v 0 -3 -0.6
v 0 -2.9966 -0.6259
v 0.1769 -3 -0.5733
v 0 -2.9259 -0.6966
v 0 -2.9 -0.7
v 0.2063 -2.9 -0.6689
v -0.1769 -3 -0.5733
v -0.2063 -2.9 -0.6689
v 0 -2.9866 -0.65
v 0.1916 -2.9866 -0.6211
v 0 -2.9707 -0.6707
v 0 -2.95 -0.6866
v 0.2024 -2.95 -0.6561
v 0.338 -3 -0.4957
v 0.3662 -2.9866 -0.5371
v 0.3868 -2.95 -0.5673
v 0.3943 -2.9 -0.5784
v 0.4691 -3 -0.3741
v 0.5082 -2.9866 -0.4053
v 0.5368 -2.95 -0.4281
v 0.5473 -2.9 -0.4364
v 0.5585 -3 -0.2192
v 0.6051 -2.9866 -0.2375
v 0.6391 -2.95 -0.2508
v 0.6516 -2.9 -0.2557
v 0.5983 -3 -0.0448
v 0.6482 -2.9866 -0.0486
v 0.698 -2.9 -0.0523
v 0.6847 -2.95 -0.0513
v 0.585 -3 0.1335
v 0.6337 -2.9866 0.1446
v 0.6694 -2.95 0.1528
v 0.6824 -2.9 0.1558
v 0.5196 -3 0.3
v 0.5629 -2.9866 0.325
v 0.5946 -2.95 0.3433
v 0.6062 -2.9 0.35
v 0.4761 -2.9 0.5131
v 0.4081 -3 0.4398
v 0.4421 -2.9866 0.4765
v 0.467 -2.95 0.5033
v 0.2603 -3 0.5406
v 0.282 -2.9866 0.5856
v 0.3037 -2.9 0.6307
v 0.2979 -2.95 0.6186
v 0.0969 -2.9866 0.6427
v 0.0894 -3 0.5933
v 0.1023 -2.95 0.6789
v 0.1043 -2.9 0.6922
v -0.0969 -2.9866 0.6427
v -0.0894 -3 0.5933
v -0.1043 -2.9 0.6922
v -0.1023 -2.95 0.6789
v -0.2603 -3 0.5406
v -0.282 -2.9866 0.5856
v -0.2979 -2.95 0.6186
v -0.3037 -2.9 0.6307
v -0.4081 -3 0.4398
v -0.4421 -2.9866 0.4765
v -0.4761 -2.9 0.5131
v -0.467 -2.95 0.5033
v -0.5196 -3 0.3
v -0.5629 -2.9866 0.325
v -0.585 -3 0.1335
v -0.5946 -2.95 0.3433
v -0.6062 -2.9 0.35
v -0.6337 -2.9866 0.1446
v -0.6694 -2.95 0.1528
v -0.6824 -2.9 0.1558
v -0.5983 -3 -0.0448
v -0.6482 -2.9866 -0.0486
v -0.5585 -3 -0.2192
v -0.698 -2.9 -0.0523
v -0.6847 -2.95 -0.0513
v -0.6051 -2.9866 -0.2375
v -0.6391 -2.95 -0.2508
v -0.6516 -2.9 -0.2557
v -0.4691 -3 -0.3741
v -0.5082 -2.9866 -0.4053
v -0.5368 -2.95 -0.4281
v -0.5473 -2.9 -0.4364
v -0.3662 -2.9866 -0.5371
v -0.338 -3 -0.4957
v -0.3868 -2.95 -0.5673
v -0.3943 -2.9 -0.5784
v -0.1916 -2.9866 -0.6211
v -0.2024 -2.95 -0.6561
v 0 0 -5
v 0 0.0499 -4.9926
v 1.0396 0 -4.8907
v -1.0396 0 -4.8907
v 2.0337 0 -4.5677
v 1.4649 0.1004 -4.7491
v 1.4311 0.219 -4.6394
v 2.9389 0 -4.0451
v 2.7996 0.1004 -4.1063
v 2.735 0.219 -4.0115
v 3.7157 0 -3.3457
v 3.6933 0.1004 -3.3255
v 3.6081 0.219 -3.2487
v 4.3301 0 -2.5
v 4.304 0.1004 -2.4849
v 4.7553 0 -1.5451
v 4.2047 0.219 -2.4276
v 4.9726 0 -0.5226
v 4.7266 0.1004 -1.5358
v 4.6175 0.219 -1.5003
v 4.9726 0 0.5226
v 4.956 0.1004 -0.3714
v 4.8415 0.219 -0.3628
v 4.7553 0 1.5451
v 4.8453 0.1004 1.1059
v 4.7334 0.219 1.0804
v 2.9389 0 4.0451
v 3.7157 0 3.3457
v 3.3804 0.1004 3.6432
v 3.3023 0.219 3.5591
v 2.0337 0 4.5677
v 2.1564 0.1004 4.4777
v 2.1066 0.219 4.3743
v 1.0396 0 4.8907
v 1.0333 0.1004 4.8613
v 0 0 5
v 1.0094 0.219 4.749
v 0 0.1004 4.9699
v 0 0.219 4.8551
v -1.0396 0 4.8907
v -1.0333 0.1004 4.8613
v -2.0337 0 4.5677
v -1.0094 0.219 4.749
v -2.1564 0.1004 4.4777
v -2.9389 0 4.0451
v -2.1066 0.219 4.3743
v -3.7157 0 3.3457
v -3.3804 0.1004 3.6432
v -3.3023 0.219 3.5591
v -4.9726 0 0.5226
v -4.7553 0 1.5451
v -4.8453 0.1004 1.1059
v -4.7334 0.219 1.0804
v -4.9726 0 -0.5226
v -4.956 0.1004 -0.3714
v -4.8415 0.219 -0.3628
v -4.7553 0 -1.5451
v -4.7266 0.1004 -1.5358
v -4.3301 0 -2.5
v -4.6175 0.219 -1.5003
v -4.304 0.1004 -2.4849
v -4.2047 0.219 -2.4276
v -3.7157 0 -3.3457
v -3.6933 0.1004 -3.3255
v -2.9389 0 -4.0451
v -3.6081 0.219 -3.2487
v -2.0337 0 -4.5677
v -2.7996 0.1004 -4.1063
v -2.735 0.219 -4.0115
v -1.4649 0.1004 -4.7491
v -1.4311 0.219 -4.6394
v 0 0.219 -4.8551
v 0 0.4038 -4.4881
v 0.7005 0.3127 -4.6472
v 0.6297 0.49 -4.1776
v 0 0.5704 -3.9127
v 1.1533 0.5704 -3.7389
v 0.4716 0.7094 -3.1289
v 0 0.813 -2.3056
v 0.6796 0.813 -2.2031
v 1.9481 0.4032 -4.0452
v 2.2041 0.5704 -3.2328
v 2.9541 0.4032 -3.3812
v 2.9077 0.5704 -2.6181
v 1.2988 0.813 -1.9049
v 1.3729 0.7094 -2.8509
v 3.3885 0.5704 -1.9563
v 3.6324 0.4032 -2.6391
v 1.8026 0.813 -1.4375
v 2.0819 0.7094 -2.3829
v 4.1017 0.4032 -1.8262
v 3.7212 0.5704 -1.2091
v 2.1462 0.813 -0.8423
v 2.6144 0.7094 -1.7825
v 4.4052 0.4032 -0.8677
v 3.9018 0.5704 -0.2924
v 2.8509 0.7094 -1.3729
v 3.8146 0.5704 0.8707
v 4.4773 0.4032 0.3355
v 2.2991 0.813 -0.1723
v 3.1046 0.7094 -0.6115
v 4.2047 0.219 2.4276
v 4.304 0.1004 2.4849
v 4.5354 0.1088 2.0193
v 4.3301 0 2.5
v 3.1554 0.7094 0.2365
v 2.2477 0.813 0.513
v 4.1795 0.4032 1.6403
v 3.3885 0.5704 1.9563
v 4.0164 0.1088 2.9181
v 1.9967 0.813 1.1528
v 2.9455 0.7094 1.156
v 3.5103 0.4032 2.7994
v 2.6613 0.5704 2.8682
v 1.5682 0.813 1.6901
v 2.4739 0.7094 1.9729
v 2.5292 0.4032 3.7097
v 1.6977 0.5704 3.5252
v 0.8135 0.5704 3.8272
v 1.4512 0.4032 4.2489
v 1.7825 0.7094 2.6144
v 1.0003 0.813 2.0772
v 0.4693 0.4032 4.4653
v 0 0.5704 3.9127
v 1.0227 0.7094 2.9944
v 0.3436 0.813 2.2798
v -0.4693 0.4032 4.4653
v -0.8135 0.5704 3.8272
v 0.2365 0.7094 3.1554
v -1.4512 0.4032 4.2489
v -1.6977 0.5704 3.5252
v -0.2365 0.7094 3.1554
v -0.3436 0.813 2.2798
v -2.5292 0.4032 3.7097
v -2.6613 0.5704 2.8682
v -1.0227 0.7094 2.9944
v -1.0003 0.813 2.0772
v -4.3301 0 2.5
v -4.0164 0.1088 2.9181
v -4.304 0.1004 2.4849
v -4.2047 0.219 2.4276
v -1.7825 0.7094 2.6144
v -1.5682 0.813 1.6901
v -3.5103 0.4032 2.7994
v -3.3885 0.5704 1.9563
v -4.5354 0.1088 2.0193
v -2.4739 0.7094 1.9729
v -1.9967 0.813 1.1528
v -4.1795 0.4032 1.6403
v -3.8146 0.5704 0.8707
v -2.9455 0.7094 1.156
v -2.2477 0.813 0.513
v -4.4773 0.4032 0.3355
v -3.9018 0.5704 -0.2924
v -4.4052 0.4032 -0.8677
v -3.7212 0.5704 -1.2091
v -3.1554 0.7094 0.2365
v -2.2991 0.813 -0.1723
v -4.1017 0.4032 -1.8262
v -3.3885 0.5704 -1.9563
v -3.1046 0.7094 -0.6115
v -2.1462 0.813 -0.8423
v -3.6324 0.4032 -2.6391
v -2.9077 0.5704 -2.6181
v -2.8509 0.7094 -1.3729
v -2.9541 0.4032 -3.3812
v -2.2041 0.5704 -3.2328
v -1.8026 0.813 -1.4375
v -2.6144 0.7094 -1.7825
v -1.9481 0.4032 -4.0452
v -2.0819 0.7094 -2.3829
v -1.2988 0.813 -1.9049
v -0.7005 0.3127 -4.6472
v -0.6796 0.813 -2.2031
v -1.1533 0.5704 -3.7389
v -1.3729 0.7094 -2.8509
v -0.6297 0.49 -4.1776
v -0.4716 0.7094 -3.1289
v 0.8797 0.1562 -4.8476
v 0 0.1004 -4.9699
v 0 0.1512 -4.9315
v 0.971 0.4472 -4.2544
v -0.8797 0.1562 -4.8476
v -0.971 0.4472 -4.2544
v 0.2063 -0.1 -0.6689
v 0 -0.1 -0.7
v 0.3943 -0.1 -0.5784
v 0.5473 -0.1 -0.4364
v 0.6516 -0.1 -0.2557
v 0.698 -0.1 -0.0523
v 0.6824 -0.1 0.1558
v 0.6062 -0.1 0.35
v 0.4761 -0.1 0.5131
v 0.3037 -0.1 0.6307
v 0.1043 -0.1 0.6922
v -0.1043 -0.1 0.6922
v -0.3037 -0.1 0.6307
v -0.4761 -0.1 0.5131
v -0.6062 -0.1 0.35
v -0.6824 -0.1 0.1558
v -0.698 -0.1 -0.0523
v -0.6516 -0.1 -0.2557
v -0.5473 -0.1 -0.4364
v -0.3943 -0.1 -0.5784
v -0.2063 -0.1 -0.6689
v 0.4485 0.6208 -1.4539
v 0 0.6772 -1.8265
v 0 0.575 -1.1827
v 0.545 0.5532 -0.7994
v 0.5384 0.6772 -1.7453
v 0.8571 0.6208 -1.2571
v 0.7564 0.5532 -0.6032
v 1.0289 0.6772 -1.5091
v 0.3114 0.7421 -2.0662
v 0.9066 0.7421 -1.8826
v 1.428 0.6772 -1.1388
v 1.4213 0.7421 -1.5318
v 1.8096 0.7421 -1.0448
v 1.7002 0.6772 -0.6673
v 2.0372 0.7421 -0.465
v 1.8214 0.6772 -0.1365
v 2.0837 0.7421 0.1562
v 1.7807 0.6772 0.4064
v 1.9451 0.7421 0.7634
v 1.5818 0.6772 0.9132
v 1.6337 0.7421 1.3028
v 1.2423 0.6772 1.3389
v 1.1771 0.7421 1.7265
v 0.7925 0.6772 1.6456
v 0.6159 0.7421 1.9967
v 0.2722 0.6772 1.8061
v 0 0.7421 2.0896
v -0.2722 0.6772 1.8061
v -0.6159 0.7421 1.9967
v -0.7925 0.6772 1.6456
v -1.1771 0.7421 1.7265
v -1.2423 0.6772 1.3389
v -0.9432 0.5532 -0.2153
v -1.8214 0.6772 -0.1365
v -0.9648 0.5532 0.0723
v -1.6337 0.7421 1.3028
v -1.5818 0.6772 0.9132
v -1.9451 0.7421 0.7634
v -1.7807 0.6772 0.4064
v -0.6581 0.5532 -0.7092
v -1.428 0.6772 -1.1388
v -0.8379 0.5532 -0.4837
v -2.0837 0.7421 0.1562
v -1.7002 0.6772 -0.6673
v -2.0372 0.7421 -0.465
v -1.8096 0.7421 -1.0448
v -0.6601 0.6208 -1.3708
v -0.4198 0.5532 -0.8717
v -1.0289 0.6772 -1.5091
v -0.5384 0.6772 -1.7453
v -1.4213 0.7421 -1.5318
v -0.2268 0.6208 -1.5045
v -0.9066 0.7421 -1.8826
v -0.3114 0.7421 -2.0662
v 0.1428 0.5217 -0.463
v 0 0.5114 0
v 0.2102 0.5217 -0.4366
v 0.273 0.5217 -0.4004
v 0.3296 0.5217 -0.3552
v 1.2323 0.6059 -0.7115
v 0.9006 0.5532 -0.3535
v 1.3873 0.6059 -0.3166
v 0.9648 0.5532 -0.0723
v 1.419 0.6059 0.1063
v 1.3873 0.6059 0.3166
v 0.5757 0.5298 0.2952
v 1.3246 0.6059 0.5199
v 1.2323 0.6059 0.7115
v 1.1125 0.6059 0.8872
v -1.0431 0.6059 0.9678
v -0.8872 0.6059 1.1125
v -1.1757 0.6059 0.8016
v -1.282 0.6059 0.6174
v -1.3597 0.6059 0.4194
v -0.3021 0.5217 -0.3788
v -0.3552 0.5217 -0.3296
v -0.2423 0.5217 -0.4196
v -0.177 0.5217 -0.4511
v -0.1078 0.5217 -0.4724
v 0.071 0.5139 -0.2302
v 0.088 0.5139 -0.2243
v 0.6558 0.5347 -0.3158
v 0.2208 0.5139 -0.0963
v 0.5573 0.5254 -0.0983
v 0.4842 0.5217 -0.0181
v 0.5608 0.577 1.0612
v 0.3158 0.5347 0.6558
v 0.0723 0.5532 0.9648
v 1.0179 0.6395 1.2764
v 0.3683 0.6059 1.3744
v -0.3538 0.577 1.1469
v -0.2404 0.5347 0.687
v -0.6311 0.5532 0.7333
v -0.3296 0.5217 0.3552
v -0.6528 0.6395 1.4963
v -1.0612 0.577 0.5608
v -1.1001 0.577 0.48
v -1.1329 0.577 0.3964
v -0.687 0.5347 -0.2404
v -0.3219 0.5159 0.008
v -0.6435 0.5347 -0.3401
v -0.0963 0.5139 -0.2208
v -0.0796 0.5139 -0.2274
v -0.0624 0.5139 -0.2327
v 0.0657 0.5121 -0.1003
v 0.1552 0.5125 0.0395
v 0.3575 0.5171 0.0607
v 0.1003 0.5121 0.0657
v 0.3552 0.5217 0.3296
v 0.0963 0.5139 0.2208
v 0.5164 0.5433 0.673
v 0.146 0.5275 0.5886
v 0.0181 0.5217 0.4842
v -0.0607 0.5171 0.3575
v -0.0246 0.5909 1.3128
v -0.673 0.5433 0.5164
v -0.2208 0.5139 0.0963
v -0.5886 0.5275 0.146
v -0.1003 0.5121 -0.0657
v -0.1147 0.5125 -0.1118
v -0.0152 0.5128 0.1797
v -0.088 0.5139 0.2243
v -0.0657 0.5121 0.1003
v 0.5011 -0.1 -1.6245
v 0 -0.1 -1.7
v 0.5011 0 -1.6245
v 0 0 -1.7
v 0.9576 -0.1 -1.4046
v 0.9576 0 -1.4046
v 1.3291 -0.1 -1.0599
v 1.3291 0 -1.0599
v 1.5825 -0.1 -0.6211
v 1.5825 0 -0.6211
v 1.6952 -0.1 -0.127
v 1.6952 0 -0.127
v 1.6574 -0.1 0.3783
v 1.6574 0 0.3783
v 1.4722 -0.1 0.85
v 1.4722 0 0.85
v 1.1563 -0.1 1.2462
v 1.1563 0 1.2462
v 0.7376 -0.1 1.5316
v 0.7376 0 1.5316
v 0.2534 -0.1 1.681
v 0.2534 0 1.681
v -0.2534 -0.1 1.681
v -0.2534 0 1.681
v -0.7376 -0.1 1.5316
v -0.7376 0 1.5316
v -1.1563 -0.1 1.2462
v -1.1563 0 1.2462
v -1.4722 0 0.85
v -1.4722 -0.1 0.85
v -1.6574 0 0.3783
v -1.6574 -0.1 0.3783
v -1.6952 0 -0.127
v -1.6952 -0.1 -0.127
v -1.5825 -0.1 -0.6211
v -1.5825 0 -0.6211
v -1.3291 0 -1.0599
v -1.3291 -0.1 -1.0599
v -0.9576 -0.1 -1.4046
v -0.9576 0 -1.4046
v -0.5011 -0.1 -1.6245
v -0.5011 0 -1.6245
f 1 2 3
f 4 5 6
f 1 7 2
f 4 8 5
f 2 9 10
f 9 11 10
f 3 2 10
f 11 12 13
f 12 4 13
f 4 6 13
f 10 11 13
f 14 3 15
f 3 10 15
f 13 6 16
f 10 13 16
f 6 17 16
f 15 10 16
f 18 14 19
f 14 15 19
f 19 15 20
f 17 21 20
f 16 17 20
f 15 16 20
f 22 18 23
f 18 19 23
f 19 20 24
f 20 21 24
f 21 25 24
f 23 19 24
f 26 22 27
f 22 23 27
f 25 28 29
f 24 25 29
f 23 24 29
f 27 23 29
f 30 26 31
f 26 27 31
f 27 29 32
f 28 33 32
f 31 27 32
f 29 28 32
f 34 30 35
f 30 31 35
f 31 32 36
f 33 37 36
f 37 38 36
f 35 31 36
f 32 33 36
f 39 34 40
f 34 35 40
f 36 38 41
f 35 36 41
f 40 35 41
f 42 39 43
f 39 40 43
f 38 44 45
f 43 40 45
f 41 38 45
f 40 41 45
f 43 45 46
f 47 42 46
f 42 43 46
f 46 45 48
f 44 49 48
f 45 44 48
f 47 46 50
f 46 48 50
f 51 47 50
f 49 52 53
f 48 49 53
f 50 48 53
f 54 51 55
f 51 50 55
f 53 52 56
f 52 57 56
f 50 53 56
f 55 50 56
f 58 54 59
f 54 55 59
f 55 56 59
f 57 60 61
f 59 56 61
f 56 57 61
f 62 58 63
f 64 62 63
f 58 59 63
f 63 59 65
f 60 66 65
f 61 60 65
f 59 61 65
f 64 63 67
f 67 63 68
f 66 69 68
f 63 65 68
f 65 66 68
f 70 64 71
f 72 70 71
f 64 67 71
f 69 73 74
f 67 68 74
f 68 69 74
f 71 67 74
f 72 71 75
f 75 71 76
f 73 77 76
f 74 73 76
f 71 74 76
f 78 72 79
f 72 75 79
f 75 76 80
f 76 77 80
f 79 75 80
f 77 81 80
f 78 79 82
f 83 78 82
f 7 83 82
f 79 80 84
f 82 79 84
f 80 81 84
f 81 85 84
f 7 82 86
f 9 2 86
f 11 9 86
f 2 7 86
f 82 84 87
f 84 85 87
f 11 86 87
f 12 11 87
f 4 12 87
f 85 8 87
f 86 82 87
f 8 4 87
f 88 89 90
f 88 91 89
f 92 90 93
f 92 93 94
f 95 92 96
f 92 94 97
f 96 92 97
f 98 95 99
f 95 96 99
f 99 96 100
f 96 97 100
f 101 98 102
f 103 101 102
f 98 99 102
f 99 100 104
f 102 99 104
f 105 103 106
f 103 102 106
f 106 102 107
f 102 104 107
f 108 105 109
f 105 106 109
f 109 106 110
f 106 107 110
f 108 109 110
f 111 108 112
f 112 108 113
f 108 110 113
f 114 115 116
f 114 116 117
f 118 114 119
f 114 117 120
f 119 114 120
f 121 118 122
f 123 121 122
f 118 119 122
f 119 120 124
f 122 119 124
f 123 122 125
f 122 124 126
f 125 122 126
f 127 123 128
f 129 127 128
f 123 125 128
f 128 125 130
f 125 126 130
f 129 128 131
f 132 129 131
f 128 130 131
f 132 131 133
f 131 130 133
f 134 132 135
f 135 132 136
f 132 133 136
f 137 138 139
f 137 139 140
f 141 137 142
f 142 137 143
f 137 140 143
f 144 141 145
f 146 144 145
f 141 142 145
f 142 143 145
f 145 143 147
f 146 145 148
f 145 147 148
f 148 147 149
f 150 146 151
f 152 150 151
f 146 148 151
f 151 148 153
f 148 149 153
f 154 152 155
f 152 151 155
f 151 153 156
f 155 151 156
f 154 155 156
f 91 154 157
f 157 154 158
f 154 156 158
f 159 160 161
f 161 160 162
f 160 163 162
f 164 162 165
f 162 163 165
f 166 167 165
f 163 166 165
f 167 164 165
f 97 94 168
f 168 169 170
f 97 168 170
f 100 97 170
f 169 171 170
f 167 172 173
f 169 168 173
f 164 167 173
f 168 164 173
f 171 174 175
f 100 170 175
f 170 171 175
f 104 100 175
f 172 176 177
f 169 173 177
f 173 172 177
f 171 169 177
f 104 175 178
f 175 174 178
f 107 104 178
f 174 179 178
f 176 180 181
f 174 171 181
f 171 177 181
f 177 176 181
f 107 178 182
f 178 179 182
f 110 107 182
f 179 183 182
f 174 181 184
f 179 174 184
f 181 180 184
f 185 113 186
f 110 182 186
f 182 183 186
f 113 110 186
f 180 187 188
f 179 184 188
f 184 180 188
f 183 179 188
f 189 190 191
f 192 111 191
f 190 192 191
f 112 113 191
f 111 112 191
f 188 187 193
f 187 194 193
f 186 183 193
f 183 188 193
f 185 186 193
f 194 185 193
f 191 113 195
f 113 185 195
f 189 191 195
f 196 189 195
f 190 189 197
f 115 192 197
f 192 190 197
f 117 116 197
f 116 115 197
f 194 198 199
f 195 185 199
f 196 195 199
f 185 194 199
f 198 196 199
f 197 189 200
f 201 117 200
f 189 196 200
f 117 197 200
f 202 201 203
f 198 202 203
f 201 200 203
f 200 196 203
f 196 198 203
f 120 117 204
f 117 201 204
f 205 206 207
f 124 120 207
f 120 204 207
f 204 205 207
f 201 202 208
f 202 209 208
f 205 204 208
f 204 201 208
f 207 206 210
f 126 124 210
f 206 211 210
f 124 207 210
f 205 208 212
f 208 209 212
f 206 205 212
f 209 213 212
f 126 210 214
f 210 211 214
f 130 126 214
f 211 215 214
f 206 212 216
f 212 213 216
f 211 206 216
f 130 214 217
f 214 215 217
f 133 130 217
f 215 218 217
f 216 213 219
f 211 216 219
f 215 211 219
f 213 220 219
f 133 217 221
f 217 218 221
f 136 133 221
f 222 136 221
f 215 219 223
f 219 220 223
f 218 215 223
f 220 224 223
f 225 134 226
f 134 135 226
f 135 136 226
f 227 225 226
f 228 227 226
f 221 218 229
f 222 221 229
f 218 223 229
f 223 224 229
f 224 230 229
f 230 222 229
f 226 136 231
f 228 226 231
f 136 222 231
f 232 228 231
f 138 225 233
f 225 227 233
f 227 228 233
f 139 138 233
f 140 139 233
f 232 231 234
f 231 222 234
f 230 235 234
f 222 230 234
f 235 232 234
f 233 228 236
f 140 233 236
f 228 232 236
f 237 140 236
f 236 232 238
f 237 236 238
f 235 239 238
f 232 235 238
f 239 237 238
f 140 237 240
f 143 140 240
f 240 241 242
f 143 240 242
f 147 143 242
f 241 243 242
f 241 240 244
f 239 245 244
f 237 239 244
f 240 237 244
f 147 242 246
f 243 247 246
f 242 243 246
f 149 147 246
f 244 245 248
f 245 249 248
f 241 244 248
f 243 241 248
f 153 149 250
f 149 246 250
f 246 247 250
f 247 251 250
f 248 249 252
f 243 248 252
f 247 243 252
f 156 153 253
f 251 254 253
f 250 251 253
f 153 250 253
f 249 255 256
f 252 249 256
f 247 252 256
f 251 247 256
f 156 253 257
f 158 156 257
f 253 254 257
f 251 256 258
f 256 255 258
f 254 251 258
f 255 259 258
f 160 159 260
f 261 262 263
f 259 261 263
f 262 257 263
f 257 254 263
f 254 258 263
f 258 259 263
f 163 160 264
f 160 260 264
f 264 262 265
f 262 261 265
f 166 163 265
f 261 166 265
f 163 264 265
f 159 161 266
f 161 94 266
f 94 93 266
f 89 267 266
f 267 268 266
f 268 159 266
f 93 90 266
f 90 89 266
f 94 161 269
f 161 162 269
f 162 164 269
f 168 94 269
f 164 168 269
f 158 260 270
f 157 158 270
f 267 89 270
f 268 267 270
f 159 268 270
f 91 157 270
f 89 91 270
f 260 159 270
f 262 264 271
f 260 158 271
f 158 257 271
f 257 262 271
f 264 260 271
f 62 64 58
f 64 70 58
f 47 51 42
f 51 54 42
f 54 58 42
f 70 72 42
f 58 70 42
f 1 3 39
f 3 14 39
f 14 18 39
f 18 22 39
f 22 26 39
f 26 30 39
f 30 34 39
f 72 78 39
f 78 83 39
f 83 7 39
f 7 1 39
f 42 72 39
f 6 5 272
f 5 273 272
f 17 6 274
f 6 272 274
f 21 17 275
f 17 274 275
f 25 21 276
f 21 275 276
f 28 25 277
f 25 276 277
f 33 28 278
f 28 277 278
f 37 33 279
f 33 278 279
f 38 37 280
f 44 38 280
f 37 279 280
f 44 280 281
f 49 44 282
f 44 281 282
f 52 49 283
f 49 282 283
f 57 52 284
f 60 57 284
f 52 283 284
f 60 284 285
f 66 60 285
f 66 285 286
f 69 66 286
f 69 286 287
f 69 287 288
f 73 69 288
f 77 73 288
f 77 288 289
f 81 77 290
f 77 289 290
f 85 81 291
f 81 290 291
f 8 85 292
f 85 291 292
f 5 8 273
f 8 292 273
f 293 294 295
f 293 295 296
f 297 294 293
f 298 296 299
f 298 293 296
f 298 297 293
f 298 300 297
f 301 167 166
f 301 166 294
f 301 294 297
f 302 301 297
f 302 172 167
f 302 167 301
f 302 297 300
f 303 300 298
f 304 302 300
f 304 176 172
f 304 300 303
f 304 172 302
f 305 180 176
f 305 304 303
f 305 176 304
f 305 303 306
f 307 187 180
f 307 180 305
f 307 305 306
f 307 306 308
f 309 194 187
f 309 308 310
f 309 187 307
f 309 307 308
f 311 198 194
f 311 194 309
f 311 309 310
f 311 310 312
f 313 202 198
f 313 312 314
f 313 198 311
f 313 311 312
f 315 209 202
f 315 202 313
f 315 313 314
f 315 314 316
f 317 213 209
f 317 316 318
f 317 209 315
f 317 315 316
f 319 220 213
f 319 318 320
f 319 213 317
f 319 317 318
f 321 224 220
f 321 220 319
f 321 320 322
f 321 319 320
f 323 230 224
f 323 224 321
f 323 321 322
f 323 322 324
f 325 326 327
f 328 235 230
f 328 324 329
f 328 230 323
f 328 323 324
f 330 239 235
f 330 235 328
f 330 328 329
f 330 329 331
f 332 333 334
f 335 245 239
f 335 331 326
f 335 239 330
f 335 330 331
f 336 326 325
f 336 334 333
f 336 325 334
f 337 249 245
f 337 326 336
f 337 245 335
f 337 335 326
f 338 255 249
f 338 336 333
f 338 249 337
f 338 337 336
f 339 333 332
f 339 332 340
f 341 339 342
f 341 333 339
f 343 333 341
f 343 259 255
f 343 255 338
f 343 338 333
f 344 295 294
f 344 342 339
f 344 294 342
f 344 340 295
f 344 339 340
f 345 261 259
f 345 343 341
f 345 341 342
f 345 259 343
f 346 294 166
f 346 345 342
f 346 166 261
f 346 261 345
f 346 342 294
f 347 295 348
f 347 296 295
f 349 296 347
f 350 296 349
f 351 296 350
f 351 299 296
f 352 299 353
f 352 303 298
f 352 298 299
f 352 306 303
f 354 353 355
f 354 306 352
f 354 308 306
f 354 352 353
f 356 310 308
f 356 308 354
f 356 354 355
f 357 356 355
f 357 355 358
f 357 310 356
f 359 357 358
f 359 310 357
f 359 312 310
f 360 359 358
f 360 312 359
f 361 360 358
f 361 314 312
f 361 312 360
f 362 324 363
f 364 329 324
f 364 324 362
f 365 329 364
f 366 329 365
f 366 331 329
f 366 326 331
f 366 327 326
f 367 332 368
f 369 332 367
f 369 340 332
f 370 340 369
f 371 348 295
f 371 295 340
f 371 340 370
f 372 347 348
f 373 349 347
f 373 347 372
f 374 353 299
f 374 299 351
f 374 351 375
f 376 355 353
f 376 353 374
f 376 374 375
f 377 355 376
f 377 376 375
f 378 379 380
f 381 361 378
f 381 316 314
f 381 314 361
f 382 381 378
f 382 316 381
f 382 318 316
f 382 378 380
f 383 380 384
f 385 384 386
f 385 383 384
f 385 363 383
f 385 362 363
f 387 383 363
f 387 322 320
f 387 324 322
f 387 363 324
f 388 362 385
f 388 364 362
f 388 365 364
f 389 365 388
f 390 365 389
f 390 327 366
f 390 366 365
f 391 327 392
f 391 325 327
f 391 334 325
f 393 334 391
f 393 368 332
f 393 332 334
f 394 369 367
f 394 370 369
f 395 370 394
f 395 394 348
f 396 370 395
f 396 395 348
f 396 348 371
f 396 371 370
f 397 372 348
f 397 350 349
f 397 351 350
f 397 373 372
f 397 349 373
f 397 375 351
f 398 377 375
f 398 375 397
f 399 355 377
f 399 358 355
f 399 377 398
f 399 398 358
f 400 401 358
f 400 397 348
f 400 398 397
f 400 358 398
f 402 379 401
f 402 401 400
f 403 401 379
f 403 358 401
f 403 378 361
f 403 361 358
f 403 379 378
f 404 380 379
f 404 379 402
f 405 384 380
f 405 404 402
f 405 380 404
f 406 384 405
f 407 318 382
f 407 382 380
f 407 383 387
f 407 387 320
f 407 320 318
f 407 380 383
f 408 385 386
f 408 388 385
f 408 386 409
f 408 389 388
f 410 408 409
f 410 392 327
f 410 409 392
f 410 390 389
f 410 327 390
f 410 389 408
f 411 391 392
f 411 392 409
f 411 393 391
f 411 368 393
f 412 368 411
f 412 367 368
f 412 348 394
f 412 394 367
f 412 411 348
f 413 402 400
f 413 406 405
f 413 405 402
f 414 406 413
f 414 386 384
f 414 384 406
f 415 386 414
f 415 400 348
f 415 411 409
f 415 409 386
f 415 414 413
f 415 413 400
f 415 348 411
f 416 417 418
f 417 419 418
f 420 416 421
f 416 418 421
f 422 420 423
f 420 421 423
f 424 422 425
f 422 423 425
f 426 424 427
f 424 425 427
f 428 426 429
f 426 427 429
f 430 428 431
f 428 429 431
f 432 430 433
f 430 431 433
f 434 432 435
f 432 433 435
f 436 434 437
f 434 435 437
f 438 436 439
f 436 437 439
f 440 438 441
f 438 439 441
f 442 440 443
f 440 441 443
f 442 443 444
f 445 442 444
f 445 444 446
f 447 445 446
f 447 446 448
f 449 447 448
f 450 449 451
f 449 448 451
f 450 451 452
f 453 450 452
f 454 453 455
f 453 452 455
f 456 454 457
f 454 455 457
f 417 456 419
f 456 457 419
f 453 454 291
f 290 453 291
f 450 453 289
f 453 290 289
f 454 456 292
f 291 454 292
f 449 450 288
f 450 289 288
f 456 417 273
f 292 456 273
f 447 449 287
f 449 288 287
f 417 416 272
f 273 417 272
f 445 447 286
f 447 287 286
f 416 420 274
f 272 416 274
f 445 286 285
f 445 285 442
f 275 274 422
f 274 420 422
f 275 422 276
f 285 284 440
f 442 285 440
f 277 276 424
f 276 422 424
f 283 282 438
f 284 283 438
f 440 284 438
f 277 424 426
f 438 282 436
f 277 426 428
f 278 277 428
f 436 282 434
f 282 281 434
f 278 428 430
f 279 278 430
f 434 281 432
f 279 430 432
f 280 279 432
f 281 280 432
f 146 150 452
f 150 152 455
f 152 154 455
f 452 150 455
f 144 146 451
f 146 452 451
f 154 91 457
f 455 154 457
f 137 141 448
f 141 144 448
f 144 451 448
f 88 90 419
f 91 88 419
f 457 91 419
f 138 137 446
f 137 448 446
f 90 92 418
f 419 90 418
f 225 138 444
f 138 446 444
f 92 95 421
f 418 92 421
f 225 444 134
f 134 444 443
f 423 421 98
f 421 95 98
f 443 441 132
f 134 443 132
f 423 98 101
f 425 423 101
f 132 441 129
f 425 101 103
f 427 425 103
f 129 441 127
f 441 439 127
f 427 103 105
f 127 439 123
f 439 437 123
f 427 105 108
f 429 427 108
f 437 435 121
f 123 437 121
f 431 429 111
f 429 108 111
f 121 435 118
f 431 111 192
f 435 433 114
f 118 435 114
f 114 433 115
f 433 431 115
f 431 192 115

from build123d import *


with BuildPart() as part:
    # Sketch1 → Revolve1 (revolve)
    with BuildSketch(Plane(origin=(0, 0, 0), x_dir=(0, 0, -1), z_dir=(1, 0, 0))):
        with BuildLine():
            Line((1.7, 0), (5, 0))
            add(Edge.make_bspline(
                [(5, 0), (5, 0.55641384), (2.305550306, 0.81298186)],
                knots=[0, 0, 0, 1.09155054, 1.09155054, 1.09155054], degree=2, weights=[1, 0.85472512, 1]))
            add(Edge.make_bspline(
                [(0, 0.511437148), (1.515183128, 0.511437148), (2.305550306, 0.81298186)],
                knots=[4.71238898, 4.71238898, 4.71238898, 5.734423248, 5.734423248, 5.734423248], degree=2, weights=[1, 0.872247515, 1]))
            Line((0, 0.511437148), (0, -3))
            Line((0, -3), (0.6, -3))
            ThreePointArc((0.6, -3), (0.670710678, -2.970710678), (0.7, -2.9))
            Line((0.7, -2.9), (0.7, -0.1))
            Line((0.7, -0.1), (1.7, -0.1))
            Line((1.7, -0.1), (1.7, 0))
        make_face()
    revolve(axis=Axis((0, 0.511437148, 0), (0, -1, 0)))


solid = part.part
